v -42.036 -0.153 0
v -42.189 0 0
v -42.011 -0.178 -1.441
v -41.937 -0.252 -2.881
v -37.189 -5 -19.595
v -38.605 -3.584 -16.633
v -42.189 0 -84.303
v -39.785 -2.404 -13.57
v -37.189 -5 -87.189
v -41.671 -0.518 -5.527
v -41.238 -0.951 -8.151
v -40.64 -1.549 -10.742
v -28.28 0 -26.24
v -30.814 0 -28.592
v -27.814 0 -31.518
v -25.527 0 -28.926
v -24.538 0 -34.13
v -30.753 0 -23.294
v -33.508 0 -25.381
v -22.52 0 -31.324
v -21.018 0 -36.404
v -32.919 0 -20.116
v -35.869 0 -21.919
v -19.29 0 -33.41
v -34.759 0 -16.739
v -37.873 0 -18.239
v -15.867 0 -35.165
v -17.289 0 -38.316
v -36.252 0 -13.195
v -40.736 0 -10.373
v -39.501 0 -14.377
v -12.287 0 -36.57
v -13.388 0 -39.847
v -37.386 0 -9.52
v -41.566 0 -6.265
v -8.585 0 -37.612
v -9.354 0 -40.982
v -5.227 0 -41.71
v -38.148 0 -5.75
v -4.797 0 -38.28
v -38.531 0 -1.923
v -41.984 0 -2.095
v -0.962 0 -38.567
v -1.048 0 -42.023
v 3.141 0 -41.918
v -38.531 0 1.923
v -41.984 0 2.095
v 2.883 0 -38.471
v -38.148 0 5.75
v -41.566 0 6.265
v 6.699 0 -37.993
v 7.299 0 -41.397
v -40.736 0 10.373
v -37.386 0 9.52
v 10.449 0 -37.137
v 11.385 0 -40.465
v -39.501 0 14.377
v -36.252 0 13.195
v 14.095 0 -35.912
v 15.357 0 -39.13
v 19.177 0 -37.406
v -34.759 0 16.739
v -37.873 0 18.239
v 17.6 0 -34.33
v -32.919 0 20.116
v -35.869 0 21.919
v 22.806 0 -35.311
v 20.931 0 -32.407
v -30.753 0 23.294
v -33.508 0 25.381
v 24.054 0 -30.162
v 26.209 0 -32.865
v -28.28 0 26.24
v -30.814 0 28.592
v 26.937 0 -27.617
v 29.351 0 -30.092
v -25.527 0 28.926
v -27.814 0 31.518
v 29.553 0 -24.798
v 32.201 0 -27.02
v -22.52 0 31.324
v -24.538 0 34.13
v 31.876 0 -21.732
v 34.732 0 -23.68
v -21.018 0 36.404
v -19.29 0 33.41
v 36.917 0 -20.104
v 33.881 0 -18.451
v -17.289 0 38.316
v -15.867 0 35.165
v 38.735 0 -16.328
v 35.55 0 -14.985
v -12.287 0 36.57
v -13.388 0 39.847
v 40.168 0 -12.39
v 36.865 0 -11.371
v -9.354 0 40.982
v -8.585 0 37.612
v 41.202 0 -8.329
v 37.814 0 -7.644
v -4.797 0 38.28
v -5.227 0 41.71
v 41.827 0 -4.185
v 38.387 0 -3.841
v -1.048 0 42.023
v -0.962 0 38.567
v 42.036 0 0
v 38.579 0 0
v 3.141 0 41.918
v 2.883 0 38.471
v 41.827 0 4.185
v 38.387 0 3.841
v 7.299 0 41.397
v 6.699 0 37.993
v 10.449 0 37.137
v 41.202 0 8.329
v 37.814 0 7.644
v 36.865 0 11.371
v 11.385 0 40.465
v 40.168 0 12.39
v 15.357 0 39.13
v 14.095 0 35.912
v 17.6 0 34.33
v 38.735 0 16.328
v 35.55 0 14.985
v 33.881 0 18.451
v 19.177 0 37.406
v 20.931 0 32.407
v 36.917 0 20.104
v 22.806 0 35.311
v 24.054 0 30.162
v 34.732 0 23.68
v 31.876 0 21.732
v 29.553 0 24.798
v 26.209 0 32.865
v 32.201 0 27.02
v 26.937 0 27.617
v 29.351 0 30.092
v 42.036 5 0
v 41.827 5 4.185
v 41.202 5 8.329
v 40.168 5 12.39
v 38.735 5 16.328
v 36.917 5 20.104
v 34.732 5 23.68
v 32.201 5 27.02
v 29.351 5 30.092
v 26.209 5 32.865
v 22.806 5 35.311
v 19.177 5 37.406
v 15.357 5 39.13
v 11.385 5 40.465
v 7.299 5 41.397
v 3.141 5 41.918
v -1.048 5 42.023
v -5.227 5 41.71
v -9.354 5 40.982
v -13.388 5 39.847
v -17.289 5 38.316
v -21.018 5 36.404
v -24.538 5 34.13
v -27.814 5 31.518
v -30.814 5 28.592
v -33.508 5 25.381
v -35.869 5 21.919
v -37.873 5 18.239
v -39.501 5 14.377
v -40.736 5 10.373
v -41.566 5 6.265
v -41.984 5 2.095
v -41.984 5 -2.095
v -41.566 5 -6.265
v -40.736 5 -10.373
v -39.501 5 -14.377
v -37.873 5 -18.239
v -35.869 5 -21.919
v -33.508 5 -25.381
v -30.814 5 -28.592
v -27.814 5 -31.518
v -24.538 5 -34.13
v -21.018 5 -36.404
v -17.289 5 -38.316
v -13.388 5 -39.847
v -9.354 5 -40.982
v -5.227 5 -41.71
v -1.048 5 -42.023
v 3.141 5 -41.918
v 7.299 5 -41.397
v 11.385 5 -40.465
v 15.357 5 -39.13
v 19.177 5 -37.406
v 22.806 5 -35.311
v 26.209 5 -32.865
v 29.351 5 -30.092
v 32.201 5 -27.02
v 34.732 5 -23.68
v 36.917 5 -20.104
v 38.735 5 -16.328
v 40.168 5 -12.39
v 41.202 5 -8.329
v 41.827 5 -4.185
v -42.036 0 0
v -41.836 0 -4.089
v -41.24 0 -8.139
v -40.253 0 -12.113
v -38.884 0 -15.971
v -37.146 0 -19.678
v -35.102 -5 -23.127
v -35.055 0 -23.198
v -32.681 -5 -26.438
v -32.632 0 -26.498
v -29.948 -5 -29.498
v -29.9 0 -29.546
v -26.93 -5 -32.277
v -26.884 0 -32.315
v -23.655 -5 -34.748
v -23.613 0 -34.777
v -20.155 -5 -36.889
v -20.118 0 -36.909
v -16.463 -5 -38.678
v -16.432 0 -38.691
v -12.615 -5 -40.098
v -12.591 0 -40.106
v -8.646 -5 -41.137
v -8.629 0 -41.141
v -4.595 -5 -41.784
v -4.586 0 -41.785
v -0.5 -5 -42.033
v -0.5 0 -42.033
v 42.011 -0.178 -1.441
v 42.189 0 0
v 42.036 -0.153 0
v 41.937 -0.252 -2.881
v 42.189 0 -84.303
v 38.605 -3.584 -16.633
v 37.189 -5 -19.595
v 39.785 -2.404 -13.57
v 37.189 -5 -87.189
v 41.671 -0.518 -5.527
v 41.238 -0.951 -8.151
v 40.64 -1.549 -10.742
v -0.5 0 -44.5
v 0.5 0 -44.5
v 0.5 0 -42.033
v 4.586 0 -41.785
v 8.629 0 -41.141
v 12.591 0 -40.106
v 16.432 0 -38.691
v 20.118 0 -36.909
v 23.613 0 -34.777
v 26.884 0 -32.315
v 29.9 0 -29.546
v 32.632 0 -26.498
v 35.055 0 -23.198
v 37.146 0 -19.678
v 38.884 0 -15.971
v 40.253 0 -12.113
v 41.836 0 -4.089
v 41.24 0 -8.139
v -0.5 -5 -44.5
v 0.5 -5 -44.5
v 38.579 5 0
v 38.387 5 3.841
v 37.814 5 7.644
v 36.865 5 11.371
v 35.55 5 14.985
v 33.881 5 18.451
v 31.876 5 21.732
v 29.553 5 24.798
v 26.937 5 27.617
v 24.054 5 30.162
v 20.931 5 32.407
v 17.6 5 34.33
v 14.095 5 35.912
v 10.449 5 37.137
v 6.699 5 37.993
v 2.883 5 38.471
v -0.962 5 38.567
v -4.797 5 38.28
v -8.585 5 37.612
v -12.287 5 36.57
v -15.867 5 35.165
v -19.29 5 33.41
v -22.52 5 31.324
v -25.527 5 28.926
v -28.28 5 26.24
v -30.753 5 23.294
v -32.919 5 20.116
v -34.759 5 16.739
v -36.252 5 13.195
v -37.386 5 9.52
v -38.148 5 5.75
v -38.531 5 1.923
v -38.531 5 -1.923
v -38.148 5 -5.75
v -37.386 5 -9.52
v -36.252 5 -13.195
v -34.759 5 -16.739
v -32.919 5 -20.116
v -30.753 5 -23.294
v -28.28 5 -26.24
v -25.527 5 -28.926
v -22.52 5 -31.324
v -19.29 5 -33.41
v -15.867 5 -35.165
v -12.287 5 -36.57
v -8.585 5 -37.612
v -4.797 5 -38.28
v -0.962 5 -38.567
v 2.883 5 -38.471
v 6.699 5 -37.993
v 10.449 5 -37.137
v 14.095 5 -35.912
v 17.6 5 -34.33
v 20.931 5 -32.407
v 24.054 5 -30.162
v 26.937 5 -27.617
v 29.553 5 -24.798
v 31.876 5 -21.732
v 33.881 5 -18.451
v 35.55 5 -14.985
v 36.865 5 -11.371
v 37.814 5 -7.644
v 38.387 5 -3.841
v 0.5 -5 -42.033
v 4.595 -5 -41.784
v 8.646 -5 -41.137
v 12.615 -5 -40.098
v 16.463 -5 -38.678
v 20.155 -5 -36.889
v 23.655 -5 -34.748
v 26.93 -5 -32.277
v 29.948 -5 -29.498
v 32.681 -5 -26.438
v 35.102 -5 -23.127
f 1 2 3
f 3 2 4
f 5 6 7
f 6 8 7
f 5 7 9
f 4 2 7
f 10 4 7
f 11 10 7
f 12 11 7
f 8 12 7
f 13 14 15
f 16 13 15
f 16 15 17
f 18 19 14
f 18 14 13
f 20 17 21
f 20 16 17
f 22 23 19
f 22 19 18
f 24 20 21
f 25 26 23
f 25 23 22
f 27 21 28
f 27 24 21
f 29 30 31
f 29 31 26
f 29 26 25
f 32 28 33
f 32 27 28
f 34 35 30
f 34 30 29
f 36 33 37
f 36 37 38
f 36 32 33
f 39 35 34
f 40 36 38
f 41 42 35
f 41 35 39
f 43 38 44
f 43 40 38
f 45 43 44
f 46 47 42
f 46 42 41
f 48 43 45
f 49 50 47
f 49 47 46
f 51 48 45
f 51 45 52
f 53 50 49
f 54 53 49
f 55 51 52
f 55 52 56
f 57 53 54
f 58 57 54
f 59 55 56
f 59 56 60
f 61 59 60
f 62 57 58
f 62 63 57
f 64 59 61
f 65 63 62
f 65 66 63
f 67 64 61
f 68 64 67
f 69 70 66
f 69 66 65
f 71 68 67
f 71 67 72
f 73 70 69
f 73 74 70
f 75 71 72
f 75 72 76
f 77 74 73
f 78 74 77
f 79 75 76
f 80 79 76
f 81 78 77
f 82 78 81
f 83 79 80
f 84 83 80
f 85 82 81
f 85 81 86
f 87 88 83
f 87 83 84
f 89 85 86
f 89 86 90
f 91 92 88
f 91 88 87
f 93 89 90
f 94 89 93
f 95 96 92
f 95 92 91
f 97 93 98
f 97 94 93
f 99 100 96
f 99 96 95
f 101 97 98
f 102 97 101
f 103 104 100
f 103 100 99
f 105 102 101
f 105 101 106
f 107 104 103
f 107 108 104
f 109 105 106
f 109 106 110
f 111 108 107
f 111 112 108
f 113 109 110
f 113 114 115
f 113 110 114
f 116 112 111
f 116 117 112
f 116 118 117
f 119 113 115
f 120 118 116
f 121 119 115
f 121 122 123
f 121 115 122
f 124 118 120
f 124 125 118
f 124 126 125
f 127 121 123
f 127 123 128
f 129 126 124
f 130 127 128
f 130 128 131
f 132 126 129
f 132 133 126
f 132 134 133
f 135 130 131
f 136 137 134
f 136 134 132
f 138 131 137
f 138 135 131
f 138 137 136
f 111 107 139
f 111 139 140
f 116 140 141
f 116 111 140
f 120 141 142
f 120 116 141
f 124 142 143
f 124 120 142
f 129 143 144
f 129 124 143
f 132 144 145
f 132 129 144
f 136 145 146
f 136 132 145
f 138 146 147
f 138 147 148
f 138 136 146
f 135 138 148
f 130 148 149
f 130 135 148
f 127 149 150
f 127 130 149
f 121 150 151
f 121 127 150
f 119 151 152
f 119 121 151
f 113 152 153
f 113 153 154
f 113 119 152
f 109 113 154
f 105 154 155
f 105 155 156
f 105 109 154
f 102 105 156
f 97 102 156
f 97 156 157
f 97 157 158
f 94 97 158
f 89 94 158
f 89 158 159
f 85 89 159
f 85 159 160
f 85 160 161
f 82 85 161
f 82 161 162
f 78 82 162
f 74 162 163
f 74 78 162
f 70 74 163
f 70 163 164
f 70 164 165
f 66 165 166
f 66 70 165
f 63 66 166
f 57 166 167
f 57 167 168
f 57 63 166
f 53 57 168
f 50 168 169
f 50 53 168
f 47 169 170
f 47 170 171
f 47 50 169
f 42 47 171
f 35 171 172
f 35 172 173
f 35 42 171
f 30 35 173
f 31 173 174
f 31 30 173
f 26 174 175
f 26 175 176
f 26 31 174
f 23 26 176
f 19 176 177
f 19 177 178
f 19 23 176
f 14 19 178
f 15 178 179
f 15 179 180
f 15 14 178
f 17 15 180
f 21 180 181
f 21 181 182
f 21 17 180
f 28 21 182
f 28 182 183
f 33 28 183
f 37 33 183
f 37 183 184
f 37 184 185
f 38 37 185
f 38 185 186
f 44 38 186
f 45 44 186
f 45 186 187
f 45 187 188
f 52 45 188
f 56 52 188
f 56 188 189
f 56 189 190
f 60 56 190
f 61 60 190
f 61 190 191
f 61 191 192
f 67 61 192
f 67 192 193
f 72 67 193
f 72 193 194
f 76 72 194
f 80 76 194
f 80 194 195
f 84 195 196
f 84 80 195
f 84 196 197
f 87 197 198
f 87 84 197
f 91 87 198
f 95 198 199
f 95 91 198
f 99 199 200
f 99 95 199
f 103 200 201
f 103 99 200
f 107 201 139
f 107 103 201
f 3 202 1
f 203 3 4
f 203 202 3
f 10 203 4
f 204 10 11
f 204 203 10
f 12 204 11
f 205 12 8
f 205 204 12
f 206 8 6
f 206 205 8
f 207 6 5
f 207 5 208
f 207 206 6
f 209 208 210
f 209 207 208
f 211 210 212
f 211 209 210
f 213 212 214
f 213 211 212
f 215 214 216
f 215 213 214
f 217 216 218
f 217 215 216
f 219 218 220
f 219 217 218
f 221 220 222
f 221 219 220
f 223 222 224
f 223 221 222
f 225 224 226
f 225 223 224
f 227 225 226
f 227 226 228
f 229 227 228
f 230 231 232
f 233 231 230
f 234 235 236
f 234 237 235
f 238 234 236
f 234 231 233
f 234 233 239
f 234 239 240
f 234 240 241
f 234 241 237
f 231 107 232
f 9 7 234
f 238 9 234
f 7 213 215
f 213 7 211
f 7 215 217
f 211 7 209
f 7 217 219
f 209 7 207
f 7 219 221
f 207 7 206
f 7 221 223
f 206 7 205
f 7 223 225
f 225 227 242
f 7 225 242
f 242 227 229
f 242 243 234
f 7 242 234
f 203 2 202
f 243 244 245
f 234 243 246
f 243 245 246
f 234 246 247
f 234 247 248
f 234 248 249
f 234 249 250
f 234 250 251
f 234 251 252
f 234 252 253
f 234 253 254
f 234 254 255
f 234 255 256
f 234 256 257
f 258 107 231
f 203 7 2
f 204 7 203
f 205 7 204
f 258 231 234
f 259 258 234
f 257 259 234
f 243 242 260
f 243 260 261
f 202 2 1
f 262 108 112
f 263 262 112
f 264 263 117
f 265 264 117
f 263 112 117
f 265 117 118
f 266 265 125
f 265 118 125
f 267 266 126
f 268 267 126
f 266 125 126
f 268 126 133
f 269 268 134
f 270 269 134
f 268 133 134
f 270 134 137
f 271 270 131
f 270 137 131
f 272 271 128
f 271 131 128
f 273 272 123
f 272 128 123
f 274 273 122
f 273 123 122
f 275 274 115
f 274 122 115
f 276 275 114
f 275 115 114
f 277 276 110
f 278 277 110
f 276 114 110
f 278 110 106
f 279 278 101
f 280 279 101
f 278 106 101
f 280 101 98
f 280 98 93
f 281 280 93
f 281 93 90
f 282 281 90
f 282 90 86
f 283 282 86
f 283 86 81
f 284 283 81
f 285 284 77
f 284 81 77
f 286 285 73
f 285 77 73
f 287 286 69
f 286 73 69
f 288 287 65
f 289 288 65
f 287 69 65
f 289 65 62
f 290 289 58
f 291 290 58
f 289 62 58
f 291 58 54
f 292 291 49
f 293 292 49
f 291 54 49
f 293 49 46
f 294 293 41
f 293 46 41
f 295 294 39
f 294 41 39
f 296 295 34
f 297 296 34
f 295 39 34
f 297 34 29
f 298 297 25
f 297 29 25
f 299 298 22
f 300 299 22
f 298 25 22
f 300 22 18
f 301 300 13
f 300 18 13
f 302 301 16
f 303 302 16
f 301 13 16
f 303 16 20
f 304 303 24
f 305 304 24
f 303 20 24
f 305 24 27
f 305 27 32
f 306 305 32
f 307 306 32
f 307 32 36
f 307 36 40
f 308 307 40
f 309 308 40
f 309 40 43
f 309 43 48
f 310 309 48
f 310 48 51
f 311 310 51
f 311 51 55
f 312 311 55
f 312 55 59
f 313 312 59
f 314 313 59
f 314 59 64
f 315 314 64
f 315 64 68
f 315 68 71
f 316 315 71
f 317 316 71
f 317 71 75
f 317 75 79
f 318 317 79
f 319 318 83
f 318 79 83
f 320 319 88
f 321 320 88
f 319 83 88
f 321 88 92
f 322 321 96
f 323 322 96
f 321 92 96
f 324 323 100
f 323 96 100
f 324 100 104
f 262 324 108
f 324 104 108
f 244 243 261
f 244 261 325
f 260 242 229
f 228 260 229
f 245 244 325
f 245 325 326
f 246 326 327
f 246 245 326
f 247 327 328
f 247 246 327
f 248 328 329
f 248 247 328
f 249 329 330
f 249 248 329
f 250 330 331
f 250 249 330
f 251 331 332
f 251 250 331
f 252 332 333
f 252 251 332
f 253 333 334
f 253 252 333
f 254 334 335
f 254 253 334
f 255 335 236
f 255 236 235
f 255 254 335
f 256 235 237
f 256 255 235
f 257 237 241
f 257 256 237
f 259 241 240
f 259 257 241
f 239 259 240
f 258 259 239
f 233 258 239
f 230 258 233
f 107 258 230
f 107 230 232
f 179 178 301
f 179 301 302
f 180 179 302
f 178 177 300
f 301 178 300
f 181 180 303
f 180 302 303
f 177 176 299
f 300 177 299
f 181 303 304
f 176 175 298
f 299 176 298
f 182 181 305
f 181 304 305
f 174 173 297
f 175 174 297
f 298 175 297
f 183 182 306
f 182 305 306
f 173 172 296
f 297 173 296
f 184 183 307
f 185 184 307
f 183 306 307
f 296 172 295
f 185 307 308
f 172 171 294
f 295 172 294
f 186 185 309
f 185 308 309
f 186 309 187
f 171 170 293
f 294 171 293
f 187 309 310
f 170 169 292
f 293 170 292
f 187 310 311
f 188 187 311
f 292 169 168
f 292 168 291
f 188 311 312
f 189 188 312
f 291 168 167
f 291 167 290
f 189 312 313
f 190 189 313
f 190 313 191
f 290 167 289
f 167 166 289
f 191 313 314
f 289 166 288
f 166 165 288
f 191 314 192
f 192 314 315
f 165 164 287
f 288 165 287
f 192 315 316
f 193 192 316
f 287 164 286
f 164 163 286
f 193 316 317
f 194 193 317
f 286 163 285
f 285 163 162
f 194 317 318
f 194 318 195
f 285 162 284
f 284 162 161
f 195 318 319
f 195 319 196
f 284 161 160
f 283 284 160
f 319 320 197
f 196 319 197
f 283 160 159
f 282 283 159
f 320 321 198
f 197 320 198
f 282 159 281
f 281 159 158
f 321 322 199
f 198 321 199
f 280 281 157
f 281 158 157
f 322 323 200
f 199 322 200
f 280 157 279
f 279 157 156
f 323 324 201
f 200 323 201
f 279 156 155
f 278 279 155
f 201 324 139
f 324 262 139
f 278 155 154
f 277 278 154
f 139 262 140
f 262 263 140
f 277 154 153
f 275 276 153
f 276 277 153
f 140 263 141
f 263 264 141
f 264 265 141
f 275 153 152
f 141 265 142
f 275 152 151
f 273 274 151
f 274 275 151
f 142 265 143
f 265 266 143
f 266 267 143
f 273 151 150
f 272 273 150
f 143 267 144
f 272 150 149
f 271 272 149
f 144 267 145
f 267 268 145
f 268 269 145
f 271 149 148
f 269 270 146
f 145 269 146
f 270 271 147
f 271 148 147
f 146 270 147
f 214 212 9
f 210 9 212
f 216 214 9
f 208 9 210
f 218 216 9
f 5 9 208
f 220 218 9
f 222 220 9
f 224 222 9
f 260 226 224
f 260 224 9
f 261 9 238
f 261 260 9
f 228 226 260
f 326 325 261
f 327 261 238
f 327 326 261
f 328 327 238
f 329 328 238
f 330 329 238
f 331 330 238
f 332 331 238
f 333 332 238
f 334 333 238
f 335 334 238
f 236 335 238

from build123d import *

# Parameters (mm, degrees)
F1_R         = 42.0358065459
F3_DEPTH     = 5
F2_R         = 38.5790977184
F4_DEPTH     = 5
F0_R         = 2
F5_DEPTH     = 25
F6_W         = 84.3785708158
F6_H         = 87.1892854079
F6_W_2       = 1
F6_H_2       = 5
F7_DEPTH     = 5
F8_DEPTH     = 5
F9_SIZE2     = 2.886741
F9_SIZE      = 4.99999
F10_T1_DEPTH = 112.9061152876


# Not quite as in the source:
# - a fillet or chamfer that OpenCascade refuses, or shapes differently, is made with other operations: its cross-section is extruded or revolved along the edge and cut away or added
# - a fillet or chamfer is up to 0.001 mm smaller than in the source, because OpenCascade refuses the exact size


with BuildPart() as f3:
    # F1 (on Front) → F3 (new body, symmetric)
    with BuildSketch(Plane.XZ):
        Circle(F1_R)
    extrude(amount=F3_DEPTH, both=True)

    # F2 (on Front) → F4 (cut)
    with BuildSketch(Plane.XZ):
        Circle(F2_R)
    extrude(amount=-F4_DEPTH, mode=Mode.SUBTRACT)

    # F0 (on Front) → F5 (cut)
    with BuildSketch(Plane.XZ):
        with BuildLine():
            ThreePointArc((26, 24), (24, 26), (22, 24))
            ThreePointArc((22, 24), (24, 22), (26, 24))
        make_face()
        with BuildLine():
            ThreePointArc((12.5, 24), (0, 27.0601182555), (-12.5, 24))
            Line((-12.5, 24), (12.5, 24))
        make_face()
        with BuildLine():
            Line((12.5, 24), (-12.5, 24))
            ThreePointArc((-12.5, 24), (-27.0601182555, 0), (-12.5, -24))
            Line((-12.5, -24), (12.5, -24))
            ThreePointArc((12.5, -24), (23.1354865757, -14.0356425184), (27.0601182555, 0))
            ThreePointArc((27.0601182555, 0), (23.1354865757, 14.0356425184), (12.5, 24))
        make_face()
        with Locations((-24, 24)):
            Circle(F0_R)
        with BuildLine():
            ThreePointArc((12.5, -24), (0, -27.0601182555), (-12.5, -24))
            Line((-12.5, -24), (-12.5, -28))
            Line((-12.5, -28), (12.5, -28))
            Line((12.5, -28), (12.5, -24))
        make_face()
        with BuildLine():
            Line((12.5, -24), (-12.5, -24))
            ThreePointArc((-12.5, -24), (0, -27.0601182555), (12.5, -24))
        make_face()
        with Locations((24, -24)):
            Circle(F0_R)
        with Locations((-24, -24)):
            Circle(F0_R)
    extrude(amount=F5_DEPTH, mode=Mode.SUBTRACT)


with BuildPart() as f7:
    # F6 (on Front) → F7 (new body)
    with BuildSketch(Plane.XZ):
        with Locations((0, -43.5946427039)):
            Rectangle(F6_W, F6_H)
        with Locations((0, -42)):
            Rectangle(F6_W_2, F6_H_2, mode=Mode.SUBTRACT)
    extrude(amount=F7_DEPTH)


with BuildPart() as f8_tool:
    # F1 (on Front) → F8 (new body)
    with BuildSketch(Plane.XZ):
        Circle(F1_R)
    extrude(amount=F8_DEPTH)


with BuildPart() as f3_1:
    add(f3.part)

    # F8: cut by f8_tool
    add(f8_tool.part, mode=Mode.SUBTRACT)


with BuildPart() as f7_1:
    add(f7.part)

    # F8: cut by f8_tool
    add(f8_tool.part, mode=Mode.SUBTRACT)

    # F9 (size 5 and 2.8867513459 in the source; OpenCascade refuses exactly that, so slightly less here)
    f9_edges = [f7_1.edges().sort_by_distance(p)[0] for p in [
        (0, 0, -87.189285),
    ]]
    f9_side = f7_1.faces().sort_by_distance((0, -2.5, -87.189285))[0]
    chamfer(f9_edges, length=F9_SIZE, length2=F9_SIZE2, reference=f9_side)

    # F10: chamfer of 5 on 2 edges, made by hand

    # F10_s2 → F10_t1 (cut)
    with BuildSketch(Plane.XY.offset(-100.0477003477)):
        Polygon((-42.1892854079, 0), (-37.1892854079, -5), (-42.1892854079, -5), align=None)
        Polygon((42.1892854079, 0), (37.1892854079, -5), (42.1892854079, -5), align=None)
    extrude(amount=F10_T1_DEPTH, mode=Mode.SUBTRACT)


solid = Compound([f3_1.part, f7_1.part])
